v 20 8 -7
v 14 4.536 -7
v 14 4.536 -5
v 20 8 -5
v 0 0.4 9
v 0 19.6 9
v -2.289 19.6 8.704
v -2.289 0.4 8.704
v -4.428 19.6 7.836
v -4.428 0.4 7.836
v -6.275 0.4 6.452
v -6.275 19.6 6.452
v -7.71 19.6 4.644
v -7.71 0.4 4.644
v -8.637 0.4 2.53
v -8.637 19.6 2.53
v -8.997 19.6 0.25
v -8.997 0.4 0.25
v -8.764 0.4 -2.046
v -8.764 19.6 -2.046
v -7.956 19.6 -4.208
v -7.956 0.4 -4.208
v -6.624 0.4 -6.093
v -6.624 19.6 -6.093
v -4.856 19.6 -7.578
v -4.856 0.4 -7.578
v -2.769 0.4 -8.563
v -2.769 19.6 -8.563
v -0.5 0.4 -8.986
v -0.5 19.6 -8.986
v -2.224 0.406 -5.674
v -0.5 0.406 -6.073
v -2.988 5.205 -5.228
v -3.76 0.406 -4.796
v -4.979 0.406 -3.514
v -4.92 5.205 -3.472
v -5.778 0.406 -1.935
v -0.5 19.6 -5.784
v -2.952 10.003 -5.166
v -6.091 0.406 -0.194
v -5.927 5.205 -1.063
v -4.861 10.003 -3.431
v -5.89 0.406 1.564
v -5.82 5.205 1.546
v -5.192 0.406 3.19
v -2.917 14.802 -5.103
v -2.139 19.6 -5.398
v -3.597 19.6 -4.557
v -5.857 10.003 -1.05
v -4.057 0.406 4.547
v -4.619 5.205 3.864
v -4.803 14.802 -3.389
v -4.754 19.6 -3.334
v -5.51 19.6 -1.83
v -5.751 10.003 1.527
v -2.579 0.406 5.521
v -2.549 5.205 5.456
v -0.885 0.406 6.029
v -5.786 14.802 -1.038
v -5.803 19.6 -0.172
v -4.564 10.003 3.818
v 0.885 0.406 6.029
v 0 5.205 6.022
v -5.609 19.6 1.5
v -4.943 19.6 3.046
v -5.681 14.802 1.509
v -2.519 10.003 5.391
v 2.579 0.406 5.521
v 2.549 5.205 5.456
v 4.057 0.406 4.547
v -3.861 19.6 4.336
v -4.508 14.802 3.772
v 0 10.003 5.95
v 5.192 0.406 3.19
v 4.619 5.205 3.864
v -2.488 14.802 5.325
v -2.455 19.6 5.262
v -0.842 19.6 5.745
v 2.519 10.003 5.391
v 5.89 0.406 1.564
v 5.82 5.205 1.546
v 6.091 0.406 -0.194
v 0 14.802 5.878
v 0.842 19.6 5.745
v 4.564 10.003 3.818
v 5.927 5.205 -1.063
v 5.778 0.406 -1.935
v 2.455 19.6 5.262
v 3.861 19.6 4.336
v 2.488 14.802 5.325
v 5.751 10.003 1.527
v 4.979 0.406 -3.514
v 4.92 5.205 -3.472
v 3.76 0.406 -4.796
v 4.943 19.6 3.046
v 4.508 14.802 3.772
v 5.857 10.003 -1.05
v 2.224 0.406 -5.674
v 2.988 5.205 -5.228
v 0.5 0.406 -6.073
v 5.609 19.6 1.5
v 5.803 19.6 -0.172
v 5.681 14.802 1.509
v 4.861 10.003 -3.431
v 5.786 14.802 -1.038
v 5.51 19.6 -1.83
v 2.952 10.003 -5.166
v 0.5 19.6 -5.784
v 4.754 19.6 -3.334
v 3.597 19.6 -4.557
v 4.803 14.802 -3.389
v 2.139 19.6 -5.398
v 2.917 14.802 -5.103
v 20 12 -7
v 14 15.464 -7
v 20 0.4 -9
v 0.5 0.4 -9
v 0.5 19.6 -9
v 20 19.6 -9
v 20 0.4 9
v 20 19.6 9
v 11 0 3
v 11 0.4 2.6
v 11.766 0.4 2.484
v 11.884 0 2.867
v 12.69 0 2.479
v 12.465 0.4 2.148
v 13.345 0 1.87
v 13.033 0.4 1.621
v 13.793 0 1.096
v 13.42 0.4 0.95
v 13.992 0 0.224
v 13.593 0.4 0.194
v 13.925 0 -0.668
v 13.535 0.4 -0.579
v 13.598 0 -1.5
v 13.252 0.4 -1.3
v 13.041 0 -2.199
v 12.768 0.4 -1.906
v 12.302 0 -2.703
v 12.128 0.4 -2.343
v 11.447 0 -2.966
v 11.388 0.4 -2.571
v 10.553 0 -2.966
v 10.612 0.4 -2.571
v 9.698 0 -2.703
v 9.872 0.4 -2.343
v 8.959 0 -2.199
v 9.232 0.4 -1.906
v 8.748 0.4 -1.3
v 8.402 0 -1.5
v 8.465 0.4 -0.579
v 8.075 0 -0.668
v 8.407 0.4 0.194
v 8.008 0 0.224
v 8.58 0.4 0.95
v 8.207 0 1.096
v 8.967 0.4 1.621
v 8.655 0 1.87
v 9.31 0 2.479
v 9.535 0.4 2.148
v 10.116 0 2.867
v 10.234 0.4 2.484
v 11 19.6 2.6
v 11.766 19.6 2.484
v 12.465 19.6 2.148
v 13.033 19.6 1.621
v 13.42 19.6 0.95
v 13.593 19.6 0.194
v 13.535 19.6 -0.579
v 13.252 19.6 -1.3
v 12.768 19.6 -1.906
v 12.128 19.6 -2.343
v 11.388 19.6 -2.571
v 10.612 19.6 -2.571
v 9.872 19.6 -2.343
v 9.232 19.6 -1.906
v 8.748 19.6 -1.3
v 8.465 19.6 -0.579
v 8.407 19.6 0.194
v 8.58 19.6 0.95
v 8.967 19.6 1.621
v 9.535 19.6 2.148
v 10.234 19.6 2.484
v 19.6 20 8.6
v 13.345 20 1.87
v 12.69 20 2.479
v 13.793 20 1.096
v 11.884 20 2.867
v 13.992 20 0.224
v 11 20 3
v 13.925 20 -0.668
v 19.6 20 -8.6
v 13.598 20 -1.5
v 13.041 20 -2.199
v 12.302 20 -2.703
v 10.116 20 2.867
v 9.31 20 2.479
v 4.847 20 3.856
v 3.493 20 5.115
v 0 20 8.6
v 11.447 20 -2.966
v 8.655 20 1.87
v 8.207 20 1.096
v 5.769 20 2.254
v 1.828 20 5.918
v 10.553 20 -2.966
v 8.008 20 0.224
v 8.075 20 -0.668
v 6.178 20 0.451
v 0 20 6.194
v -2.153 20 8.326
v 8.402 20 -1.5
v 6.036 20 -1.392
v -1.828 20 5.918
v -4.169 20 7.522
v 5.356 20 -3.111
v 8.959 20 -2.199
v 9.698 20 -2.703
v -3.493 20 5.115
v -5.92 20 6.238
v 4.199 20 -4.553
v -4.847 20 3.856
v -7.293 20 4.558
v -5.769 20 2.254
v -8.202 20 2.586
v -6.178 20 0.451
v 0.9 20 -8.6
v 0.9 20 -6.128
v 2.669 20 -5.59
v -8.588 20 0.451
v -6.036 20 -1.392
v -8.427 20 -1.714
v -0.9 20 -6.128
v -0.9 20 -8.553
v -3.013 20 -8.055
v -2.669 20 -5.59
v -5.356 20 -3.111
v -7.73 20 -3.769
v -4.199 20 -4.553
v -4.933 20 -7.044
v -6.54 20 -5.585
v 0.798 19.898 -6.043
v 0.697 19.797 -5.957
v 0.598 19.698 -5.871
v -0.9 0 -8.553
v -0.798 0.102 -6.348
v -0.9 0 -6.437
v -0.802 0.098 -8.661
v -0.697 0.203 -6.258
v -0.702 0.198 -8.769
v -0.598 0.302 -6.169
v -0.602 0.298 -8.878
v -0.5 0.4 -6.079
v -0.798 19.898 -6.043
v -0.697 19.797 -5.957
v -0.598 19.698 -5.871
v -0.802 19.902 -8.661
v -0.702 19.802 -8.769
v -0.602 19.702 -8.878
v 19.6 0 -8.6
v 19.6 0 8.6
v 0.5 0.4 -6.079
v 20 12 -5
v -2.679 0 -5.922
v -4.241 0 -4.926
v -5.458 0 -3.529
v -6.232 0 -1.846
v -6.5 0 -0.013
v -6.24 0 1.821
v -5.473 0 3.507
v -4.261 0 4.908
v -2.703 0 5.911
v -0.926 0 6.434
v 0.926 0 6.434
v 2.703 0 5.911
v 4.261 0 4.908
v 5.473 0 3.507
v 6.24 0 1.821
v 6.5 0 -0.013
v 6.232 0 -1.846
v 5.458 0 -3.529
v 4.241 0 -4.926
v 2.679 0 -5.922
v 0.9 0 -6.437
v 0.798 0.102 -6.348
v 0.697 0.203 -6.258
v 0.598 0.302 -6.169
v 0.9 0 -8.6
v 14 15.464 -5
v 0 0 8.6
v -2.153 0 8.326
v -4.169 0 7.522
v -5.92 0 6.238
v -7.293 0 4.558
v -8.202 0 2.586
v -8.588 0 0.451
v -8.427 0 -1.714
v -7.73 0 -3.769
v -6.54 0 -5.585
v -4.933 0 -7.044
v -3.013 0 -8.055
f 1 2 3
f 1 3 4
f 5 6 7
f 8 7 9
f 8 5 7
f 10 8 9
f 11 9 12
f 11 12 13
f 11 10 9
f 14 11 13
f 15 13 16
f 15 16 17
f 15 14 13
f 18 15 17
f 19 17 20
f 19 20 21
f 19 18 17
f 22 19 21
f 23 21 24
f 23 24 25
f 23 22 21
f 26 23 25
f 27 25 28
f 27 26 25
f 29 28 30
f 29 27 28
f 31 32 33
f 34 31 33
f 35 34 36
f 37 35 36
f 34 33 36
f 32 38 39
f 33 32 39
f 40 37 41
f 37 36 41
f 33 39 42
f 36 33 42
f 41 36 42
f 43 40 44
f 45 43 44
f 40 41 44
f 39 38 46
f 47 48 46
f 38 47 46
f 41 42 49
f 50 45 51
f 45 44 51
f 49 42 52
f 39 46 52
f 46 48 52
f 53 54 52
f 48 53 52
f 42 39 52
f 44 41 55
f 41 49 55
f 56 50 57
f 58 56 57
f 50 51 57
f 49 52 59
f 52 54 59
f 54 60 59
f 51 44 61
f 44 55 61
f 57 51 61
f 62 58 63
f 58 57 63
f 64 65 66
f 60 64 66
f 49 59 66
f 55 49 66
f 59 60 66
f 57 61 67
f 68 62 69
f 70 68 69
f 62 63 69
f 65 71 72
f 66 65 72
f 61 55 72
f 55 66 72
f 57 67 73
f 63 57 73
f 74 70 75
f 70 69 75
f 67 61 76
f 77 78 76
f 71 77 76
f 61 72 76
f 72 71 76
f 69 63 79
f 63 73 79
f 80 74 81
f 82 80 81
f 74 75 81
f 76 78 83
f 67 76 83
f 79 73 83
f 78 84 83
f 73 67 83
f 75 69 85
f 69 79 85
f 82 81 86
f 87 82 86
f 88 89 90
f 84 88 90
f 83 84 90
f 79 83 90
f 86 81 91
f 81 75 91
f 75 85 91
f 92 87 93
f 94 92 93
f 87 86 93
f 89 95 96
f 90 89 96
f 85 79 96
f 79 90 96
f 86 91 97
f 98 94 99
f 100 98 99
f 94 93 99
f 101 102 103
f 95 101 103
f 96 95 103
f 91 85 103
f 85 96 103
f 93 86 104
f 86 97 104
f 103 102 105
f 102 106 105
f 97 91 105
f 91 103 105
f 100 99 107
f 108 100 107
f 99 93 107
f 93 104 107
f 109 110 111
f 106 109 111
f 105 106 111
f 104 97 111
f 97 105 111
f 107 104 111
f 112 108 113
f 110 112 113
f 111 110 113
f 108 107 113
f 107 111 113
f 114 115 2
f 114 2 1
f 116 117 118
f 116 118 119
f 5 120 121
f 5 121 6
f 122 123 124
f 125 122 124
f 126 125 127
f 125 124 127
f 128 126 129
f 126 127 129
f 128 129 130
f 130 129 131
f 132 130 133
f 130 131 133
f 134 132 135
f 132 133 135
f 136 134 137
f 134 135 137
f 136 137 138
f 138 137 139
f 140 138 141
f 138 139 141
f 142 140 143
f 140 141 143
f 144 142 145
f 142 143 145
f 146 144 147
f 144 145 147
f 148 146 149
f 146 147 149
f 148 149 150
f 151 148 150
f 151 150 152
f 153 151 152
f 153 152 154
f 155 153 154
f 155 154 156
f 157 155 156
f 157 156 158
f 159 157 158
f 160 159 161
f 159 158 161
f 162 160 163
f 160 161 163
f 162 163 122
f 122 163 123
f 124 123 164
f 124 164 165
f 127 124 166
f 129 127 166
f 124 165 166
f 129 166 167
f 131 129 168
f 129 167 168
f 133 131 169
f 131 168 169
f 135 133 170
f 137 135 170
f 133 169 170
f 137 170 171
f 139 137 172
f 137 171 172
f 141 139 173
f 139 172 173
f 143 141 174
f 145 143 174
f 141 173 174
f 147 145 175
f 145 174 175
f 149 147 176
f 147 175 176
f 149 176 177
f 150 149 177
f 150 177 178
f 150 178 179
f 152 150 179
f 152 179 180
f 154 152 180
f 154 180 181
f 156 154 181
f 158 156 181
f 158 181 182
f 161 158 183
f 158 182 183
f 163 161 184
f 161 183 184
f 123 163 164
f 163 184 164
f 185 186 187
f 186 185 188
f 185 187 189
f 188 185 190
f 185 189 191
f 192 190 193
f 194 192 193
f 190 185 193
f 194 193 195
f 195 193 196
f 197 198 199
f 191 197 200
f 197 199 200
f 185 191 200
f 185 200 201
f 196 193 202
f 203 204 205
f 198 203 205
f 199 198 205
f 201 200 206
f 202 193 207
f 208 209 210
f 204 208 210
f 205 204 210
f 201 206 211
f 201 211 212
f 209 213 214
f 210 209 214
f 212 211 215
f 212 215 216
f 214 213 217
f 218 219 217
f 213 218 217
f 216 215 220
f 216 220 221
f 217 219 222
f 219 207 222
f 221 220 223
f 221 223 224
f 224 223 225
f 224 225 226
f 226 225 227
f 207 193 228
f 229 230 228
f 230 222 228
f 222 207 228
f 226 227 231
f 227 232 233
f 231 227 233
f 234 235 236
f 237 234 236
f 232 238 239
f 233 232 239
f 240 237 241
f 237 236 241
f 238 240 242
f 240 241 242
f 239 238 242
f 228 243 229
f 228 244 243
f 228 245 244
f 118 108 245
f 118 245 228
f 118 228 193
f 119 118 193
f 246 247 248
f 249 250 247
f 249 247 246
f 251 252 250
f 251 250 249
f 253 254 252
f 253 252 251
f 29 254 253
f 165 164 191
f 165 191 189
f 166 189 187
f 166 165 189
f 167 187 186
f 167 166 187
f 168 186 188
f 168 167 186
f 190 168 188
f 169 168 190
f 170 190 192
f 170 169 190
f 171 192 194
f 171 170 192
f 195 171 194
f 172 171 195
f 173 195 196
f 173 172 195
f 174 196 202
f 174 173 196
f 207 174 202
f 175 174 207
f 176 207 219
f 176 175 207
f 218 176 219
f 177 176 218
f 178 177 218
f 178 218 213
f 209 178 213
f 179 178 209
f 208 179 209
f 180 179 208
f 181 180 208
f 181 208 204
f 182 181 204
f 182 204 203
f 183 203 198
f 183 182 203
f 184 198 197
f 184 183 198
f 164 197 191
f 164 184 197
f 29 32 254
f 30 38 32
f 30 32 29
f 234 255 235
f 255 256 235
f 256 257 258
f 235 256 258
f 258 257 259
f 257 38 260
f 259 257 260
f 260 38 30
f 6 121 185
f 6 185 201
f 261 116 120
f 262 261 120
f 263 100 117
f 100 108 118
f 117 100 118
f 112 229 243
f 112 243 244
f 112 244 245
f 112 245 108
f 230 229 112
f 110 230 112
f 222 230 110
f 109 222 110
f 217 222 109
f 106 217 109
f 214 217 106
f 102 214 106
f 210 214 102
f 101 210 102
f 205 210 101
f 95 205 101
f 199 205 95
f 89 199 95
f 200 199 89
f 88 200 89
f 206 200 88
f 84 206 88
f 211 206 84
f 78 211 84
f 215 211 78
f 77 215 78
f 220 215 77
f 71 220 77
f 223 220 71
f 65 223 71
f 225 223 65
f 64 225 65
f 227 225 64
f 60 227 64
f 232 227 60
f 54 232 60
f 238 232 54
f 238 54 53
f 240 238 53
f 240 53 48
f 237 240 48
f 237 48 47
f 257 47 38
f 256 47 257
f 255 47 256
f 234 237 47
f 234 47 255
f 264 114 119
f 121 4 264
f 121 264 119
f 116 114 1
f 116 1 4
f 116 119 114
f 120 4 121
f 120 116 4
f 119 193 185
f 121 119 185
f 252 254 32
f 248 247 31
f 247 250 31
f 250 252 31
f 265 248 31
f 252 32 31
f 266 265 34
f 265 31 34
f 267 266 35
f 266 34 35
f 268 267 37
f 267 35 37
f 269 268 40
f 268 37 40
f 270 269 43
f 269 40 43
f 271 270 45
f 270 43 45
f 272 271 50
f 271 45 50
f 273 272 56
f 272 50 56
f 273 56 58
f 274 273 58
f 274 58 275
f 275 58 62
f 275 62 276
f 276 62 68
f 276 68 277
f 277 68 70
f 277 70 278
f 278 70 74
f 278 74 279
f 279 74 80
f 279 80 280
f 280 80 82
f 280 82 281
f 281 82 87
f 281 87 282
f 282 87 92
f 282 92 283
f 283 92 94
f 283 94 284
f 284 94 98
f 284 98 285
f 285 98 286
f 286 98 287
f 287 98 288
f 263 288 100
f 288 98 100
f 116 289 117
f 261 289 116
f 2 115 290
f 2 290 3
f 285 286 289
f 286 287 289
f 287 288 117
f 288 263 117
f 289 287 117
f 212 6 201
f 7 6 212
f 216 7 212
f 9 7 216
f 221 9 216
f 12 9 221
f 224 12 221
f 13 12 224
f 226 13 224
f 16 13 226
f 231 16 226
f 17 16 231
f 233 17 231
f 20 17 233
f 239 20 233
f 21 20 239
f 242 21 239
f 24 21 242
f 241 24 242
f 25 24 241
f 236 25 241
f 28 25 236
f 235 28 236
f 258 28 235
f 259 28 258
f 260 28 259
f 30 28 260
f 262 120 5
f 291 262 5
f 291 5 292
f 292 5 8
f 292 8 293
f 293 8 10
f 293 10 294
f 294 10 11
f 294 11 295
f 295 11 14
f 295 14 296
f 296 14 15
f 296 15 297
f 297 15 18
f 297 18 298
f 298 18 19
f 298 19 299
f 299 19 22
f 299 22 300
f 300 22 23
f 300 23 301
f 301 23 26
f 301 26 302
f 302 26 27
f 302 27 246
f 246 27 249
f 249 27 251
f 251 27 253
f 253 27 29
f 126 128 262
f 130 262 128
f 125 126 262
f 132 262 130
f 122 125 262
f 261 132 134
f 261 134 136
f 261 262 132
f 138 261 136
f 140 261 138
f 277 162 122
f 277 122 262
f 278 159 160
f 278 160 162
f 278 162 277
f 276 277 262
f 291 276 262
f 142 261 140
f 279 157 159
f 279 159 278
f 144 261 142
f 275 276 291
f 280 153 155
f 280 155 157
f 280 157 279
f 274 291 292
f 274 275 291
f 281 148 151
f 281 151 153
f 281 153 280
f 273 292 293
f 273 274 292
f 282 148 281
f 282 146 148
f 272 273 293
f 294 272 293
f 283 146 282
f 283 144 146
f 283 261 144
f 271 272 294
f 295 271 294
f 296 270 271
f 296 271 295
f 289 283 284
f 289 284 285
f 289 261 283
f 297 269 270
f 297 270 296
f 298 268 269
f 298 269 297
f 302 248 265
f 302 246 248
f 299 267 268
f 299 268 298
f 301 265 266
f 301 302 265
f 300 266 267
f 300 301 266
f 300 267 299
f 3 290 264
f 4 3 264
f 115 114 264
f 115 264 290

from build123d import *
from OCP.BRepFilletAPI import BRepFilletAPI_MakeChamfer

# Parameters (mm, degrees)
BOSS_EXTRUDE1_DEPTH = 20
SKETCH4_W           = 1
SKETCH4_H           = 9
CUT_EXTRUDE2_DEPTH  = 20
CUT_EXTRUDE4_START  = -2
CUT_EXTRUDE4_DEPTH  = 2
SKETCH5_R           = 2.6
CUT_EXTRUDE5_DEPTH  = 20
CHAMFER1_SIZE       = 0.4
CHAMFER1_SIZE2      = 0.406137053
CHAMFER1_SIZE2_2    = 0.394133002


with BuildPart() as part:
    # Sketch1 → Boss-Extrude1 (new body)
    with BuildSketch(Plane(origin=(0, 0, 0), x_dir=(1, 0, 0), z_dir=(0, 1, 0))):
        with BuildLine():
            Line((0, 9), (20, 9))
            Line((20, 9), (20, -9))
            Line((20, -9), (0, -9))
            ThreePointArc((0, -9), (-9, 0), (0, 9))
        make_face()
    extrude(amount=BOSS_EXTRUDE1_DEPTH)

    # Sketch7 → Cut-Revolve1 (revolve, cut)
    with BuildSketch(Plane.XY, mode=Mode.PRIVATE) as cut_revolve1_sk:
        Polygon((0, 0), (-6.1, 0), (-5.8, 20), (0, 20), align=None)
    revolve(cut_revolve1_sk.sketch.rotate(Axis((0, 20, 0), (0, 1, 0)), 180), axis=Axis((0, 20, 0), (0, 1, 0)), mode=Mode.SUBTRACT)

    # Sketch4 → Cut-Extrude2 (cut)
    with BuildSketch(Plane(origin=(0, 20, 0), x_dir=(1, 0, 0), z_dir=(0, 1, 0))):
        with Locations((0, 4.5)):
            Rectangle(SKETCH4_W, SKETCH4_H)
    extrude(amount=-CUT_EXTRUDE2_DEPTH, mode=Mode.SUBTRACT)

    # Sketch6 → Cut-Extrude4 (cut)
    with BuildSketch(Plane(origin=(0, 0, -9), x_dir=(-1, 0, 0), z_dir=(0, 0, -1)).offset(CUT_EXTRUDE4_START)):
        Polygon((-20, 12), (-14, 15.464101615), (-14, 4.535898385), (-20, 8), align=None)
    extrude(amount=-CUT_EXTRUDE4_DEPTH, mode=Mode.SUBTRACT)

    # Sketch5 → Cut-Extrude5 (cut)
    with BuildSketch(Plane(origin=(0, 20, 0), x_dir=(1, 0, 0), z_dir=(0, 1, 0))):
        with Locations(Location((11, 0, 0), (0, 0, 270))):
            Circle(SKETCH5_R)
    extrude(amount=-CUT_EXTRUDE5_DEPTH, mode=Mode.SUBTRACT)

    # Chamfer1: one chamfer whose edges measure the first distance from different faces: ONE call of the kernel's chamfer builder (chamfer() names one face for all edges)
    chamfer1_edges_1 = [part.edges().sort_by_distance(p)[0] for p in [
        (0, 0, 6.1),
    ]]
    chamfer1_side_1 = [part.faces().sort_by_distance(p)[0] for p in [
        (8.32015875, 0, 0.063305036),
    ]]
    chamfer1_edges_2 = [part.edges().sort_by_distance(p)[0] for p in [
        (0.5, 0, -7.539736831),
        (10.25, 0, -9),
        (20, 0, 0),
        (10, 0, 9),
        (-0.5, 0, -7.53278702),
        (-8.996524423, 0, 0.250096581),
        (11, 0, -2.6),
        (0.5, 20, -7.389204043),
        (10.25, 20, -9),
        (20, 20, 0),
        (10, 20, 9),
        (-8.996524423, 20, 0.250096581),
        (-0.5, 20, -7.382254232),
        (11, 20, -2.6),
    ]]
    chamfer1_edges_3 = [part.edges().sort_by_distance(p)[0] for p in [
        (0, 20, 5.8),
    ]]
    chamfer1_side_3 = [part.faces().sort_by_distance(p)[0] for p in [
        (0, 10, 5.95),
    ]]
    chamfer1 = BRepFilletAPI_MakeChamfer(part.part.solid().wrapped)
    for e in chamfer1_edges_1:
        chamfer1.Add(CHAMFER1_SIZE, CHAMFER1_SIZE2, e.wrapped, chamfer1_side_1[0].wrapped)  # the first distance lies on this face
    for e in chamfer1_edges_2:
        chamfer1.Add(CHAMFER1_SIZE, e.wrapped)
    for e in chamfer1_edges_3:
        chamfer1.Add(CHAMFER1_SIZE, CHAMFER1_SIZE2_2, e.wrapped, chamfer1_side_3[0].wrapped)  # the first distance lies on this face
    add(Compound.cast(chamfer1.Shape()), mode=Mode.REPLACE)


solid = part.part
